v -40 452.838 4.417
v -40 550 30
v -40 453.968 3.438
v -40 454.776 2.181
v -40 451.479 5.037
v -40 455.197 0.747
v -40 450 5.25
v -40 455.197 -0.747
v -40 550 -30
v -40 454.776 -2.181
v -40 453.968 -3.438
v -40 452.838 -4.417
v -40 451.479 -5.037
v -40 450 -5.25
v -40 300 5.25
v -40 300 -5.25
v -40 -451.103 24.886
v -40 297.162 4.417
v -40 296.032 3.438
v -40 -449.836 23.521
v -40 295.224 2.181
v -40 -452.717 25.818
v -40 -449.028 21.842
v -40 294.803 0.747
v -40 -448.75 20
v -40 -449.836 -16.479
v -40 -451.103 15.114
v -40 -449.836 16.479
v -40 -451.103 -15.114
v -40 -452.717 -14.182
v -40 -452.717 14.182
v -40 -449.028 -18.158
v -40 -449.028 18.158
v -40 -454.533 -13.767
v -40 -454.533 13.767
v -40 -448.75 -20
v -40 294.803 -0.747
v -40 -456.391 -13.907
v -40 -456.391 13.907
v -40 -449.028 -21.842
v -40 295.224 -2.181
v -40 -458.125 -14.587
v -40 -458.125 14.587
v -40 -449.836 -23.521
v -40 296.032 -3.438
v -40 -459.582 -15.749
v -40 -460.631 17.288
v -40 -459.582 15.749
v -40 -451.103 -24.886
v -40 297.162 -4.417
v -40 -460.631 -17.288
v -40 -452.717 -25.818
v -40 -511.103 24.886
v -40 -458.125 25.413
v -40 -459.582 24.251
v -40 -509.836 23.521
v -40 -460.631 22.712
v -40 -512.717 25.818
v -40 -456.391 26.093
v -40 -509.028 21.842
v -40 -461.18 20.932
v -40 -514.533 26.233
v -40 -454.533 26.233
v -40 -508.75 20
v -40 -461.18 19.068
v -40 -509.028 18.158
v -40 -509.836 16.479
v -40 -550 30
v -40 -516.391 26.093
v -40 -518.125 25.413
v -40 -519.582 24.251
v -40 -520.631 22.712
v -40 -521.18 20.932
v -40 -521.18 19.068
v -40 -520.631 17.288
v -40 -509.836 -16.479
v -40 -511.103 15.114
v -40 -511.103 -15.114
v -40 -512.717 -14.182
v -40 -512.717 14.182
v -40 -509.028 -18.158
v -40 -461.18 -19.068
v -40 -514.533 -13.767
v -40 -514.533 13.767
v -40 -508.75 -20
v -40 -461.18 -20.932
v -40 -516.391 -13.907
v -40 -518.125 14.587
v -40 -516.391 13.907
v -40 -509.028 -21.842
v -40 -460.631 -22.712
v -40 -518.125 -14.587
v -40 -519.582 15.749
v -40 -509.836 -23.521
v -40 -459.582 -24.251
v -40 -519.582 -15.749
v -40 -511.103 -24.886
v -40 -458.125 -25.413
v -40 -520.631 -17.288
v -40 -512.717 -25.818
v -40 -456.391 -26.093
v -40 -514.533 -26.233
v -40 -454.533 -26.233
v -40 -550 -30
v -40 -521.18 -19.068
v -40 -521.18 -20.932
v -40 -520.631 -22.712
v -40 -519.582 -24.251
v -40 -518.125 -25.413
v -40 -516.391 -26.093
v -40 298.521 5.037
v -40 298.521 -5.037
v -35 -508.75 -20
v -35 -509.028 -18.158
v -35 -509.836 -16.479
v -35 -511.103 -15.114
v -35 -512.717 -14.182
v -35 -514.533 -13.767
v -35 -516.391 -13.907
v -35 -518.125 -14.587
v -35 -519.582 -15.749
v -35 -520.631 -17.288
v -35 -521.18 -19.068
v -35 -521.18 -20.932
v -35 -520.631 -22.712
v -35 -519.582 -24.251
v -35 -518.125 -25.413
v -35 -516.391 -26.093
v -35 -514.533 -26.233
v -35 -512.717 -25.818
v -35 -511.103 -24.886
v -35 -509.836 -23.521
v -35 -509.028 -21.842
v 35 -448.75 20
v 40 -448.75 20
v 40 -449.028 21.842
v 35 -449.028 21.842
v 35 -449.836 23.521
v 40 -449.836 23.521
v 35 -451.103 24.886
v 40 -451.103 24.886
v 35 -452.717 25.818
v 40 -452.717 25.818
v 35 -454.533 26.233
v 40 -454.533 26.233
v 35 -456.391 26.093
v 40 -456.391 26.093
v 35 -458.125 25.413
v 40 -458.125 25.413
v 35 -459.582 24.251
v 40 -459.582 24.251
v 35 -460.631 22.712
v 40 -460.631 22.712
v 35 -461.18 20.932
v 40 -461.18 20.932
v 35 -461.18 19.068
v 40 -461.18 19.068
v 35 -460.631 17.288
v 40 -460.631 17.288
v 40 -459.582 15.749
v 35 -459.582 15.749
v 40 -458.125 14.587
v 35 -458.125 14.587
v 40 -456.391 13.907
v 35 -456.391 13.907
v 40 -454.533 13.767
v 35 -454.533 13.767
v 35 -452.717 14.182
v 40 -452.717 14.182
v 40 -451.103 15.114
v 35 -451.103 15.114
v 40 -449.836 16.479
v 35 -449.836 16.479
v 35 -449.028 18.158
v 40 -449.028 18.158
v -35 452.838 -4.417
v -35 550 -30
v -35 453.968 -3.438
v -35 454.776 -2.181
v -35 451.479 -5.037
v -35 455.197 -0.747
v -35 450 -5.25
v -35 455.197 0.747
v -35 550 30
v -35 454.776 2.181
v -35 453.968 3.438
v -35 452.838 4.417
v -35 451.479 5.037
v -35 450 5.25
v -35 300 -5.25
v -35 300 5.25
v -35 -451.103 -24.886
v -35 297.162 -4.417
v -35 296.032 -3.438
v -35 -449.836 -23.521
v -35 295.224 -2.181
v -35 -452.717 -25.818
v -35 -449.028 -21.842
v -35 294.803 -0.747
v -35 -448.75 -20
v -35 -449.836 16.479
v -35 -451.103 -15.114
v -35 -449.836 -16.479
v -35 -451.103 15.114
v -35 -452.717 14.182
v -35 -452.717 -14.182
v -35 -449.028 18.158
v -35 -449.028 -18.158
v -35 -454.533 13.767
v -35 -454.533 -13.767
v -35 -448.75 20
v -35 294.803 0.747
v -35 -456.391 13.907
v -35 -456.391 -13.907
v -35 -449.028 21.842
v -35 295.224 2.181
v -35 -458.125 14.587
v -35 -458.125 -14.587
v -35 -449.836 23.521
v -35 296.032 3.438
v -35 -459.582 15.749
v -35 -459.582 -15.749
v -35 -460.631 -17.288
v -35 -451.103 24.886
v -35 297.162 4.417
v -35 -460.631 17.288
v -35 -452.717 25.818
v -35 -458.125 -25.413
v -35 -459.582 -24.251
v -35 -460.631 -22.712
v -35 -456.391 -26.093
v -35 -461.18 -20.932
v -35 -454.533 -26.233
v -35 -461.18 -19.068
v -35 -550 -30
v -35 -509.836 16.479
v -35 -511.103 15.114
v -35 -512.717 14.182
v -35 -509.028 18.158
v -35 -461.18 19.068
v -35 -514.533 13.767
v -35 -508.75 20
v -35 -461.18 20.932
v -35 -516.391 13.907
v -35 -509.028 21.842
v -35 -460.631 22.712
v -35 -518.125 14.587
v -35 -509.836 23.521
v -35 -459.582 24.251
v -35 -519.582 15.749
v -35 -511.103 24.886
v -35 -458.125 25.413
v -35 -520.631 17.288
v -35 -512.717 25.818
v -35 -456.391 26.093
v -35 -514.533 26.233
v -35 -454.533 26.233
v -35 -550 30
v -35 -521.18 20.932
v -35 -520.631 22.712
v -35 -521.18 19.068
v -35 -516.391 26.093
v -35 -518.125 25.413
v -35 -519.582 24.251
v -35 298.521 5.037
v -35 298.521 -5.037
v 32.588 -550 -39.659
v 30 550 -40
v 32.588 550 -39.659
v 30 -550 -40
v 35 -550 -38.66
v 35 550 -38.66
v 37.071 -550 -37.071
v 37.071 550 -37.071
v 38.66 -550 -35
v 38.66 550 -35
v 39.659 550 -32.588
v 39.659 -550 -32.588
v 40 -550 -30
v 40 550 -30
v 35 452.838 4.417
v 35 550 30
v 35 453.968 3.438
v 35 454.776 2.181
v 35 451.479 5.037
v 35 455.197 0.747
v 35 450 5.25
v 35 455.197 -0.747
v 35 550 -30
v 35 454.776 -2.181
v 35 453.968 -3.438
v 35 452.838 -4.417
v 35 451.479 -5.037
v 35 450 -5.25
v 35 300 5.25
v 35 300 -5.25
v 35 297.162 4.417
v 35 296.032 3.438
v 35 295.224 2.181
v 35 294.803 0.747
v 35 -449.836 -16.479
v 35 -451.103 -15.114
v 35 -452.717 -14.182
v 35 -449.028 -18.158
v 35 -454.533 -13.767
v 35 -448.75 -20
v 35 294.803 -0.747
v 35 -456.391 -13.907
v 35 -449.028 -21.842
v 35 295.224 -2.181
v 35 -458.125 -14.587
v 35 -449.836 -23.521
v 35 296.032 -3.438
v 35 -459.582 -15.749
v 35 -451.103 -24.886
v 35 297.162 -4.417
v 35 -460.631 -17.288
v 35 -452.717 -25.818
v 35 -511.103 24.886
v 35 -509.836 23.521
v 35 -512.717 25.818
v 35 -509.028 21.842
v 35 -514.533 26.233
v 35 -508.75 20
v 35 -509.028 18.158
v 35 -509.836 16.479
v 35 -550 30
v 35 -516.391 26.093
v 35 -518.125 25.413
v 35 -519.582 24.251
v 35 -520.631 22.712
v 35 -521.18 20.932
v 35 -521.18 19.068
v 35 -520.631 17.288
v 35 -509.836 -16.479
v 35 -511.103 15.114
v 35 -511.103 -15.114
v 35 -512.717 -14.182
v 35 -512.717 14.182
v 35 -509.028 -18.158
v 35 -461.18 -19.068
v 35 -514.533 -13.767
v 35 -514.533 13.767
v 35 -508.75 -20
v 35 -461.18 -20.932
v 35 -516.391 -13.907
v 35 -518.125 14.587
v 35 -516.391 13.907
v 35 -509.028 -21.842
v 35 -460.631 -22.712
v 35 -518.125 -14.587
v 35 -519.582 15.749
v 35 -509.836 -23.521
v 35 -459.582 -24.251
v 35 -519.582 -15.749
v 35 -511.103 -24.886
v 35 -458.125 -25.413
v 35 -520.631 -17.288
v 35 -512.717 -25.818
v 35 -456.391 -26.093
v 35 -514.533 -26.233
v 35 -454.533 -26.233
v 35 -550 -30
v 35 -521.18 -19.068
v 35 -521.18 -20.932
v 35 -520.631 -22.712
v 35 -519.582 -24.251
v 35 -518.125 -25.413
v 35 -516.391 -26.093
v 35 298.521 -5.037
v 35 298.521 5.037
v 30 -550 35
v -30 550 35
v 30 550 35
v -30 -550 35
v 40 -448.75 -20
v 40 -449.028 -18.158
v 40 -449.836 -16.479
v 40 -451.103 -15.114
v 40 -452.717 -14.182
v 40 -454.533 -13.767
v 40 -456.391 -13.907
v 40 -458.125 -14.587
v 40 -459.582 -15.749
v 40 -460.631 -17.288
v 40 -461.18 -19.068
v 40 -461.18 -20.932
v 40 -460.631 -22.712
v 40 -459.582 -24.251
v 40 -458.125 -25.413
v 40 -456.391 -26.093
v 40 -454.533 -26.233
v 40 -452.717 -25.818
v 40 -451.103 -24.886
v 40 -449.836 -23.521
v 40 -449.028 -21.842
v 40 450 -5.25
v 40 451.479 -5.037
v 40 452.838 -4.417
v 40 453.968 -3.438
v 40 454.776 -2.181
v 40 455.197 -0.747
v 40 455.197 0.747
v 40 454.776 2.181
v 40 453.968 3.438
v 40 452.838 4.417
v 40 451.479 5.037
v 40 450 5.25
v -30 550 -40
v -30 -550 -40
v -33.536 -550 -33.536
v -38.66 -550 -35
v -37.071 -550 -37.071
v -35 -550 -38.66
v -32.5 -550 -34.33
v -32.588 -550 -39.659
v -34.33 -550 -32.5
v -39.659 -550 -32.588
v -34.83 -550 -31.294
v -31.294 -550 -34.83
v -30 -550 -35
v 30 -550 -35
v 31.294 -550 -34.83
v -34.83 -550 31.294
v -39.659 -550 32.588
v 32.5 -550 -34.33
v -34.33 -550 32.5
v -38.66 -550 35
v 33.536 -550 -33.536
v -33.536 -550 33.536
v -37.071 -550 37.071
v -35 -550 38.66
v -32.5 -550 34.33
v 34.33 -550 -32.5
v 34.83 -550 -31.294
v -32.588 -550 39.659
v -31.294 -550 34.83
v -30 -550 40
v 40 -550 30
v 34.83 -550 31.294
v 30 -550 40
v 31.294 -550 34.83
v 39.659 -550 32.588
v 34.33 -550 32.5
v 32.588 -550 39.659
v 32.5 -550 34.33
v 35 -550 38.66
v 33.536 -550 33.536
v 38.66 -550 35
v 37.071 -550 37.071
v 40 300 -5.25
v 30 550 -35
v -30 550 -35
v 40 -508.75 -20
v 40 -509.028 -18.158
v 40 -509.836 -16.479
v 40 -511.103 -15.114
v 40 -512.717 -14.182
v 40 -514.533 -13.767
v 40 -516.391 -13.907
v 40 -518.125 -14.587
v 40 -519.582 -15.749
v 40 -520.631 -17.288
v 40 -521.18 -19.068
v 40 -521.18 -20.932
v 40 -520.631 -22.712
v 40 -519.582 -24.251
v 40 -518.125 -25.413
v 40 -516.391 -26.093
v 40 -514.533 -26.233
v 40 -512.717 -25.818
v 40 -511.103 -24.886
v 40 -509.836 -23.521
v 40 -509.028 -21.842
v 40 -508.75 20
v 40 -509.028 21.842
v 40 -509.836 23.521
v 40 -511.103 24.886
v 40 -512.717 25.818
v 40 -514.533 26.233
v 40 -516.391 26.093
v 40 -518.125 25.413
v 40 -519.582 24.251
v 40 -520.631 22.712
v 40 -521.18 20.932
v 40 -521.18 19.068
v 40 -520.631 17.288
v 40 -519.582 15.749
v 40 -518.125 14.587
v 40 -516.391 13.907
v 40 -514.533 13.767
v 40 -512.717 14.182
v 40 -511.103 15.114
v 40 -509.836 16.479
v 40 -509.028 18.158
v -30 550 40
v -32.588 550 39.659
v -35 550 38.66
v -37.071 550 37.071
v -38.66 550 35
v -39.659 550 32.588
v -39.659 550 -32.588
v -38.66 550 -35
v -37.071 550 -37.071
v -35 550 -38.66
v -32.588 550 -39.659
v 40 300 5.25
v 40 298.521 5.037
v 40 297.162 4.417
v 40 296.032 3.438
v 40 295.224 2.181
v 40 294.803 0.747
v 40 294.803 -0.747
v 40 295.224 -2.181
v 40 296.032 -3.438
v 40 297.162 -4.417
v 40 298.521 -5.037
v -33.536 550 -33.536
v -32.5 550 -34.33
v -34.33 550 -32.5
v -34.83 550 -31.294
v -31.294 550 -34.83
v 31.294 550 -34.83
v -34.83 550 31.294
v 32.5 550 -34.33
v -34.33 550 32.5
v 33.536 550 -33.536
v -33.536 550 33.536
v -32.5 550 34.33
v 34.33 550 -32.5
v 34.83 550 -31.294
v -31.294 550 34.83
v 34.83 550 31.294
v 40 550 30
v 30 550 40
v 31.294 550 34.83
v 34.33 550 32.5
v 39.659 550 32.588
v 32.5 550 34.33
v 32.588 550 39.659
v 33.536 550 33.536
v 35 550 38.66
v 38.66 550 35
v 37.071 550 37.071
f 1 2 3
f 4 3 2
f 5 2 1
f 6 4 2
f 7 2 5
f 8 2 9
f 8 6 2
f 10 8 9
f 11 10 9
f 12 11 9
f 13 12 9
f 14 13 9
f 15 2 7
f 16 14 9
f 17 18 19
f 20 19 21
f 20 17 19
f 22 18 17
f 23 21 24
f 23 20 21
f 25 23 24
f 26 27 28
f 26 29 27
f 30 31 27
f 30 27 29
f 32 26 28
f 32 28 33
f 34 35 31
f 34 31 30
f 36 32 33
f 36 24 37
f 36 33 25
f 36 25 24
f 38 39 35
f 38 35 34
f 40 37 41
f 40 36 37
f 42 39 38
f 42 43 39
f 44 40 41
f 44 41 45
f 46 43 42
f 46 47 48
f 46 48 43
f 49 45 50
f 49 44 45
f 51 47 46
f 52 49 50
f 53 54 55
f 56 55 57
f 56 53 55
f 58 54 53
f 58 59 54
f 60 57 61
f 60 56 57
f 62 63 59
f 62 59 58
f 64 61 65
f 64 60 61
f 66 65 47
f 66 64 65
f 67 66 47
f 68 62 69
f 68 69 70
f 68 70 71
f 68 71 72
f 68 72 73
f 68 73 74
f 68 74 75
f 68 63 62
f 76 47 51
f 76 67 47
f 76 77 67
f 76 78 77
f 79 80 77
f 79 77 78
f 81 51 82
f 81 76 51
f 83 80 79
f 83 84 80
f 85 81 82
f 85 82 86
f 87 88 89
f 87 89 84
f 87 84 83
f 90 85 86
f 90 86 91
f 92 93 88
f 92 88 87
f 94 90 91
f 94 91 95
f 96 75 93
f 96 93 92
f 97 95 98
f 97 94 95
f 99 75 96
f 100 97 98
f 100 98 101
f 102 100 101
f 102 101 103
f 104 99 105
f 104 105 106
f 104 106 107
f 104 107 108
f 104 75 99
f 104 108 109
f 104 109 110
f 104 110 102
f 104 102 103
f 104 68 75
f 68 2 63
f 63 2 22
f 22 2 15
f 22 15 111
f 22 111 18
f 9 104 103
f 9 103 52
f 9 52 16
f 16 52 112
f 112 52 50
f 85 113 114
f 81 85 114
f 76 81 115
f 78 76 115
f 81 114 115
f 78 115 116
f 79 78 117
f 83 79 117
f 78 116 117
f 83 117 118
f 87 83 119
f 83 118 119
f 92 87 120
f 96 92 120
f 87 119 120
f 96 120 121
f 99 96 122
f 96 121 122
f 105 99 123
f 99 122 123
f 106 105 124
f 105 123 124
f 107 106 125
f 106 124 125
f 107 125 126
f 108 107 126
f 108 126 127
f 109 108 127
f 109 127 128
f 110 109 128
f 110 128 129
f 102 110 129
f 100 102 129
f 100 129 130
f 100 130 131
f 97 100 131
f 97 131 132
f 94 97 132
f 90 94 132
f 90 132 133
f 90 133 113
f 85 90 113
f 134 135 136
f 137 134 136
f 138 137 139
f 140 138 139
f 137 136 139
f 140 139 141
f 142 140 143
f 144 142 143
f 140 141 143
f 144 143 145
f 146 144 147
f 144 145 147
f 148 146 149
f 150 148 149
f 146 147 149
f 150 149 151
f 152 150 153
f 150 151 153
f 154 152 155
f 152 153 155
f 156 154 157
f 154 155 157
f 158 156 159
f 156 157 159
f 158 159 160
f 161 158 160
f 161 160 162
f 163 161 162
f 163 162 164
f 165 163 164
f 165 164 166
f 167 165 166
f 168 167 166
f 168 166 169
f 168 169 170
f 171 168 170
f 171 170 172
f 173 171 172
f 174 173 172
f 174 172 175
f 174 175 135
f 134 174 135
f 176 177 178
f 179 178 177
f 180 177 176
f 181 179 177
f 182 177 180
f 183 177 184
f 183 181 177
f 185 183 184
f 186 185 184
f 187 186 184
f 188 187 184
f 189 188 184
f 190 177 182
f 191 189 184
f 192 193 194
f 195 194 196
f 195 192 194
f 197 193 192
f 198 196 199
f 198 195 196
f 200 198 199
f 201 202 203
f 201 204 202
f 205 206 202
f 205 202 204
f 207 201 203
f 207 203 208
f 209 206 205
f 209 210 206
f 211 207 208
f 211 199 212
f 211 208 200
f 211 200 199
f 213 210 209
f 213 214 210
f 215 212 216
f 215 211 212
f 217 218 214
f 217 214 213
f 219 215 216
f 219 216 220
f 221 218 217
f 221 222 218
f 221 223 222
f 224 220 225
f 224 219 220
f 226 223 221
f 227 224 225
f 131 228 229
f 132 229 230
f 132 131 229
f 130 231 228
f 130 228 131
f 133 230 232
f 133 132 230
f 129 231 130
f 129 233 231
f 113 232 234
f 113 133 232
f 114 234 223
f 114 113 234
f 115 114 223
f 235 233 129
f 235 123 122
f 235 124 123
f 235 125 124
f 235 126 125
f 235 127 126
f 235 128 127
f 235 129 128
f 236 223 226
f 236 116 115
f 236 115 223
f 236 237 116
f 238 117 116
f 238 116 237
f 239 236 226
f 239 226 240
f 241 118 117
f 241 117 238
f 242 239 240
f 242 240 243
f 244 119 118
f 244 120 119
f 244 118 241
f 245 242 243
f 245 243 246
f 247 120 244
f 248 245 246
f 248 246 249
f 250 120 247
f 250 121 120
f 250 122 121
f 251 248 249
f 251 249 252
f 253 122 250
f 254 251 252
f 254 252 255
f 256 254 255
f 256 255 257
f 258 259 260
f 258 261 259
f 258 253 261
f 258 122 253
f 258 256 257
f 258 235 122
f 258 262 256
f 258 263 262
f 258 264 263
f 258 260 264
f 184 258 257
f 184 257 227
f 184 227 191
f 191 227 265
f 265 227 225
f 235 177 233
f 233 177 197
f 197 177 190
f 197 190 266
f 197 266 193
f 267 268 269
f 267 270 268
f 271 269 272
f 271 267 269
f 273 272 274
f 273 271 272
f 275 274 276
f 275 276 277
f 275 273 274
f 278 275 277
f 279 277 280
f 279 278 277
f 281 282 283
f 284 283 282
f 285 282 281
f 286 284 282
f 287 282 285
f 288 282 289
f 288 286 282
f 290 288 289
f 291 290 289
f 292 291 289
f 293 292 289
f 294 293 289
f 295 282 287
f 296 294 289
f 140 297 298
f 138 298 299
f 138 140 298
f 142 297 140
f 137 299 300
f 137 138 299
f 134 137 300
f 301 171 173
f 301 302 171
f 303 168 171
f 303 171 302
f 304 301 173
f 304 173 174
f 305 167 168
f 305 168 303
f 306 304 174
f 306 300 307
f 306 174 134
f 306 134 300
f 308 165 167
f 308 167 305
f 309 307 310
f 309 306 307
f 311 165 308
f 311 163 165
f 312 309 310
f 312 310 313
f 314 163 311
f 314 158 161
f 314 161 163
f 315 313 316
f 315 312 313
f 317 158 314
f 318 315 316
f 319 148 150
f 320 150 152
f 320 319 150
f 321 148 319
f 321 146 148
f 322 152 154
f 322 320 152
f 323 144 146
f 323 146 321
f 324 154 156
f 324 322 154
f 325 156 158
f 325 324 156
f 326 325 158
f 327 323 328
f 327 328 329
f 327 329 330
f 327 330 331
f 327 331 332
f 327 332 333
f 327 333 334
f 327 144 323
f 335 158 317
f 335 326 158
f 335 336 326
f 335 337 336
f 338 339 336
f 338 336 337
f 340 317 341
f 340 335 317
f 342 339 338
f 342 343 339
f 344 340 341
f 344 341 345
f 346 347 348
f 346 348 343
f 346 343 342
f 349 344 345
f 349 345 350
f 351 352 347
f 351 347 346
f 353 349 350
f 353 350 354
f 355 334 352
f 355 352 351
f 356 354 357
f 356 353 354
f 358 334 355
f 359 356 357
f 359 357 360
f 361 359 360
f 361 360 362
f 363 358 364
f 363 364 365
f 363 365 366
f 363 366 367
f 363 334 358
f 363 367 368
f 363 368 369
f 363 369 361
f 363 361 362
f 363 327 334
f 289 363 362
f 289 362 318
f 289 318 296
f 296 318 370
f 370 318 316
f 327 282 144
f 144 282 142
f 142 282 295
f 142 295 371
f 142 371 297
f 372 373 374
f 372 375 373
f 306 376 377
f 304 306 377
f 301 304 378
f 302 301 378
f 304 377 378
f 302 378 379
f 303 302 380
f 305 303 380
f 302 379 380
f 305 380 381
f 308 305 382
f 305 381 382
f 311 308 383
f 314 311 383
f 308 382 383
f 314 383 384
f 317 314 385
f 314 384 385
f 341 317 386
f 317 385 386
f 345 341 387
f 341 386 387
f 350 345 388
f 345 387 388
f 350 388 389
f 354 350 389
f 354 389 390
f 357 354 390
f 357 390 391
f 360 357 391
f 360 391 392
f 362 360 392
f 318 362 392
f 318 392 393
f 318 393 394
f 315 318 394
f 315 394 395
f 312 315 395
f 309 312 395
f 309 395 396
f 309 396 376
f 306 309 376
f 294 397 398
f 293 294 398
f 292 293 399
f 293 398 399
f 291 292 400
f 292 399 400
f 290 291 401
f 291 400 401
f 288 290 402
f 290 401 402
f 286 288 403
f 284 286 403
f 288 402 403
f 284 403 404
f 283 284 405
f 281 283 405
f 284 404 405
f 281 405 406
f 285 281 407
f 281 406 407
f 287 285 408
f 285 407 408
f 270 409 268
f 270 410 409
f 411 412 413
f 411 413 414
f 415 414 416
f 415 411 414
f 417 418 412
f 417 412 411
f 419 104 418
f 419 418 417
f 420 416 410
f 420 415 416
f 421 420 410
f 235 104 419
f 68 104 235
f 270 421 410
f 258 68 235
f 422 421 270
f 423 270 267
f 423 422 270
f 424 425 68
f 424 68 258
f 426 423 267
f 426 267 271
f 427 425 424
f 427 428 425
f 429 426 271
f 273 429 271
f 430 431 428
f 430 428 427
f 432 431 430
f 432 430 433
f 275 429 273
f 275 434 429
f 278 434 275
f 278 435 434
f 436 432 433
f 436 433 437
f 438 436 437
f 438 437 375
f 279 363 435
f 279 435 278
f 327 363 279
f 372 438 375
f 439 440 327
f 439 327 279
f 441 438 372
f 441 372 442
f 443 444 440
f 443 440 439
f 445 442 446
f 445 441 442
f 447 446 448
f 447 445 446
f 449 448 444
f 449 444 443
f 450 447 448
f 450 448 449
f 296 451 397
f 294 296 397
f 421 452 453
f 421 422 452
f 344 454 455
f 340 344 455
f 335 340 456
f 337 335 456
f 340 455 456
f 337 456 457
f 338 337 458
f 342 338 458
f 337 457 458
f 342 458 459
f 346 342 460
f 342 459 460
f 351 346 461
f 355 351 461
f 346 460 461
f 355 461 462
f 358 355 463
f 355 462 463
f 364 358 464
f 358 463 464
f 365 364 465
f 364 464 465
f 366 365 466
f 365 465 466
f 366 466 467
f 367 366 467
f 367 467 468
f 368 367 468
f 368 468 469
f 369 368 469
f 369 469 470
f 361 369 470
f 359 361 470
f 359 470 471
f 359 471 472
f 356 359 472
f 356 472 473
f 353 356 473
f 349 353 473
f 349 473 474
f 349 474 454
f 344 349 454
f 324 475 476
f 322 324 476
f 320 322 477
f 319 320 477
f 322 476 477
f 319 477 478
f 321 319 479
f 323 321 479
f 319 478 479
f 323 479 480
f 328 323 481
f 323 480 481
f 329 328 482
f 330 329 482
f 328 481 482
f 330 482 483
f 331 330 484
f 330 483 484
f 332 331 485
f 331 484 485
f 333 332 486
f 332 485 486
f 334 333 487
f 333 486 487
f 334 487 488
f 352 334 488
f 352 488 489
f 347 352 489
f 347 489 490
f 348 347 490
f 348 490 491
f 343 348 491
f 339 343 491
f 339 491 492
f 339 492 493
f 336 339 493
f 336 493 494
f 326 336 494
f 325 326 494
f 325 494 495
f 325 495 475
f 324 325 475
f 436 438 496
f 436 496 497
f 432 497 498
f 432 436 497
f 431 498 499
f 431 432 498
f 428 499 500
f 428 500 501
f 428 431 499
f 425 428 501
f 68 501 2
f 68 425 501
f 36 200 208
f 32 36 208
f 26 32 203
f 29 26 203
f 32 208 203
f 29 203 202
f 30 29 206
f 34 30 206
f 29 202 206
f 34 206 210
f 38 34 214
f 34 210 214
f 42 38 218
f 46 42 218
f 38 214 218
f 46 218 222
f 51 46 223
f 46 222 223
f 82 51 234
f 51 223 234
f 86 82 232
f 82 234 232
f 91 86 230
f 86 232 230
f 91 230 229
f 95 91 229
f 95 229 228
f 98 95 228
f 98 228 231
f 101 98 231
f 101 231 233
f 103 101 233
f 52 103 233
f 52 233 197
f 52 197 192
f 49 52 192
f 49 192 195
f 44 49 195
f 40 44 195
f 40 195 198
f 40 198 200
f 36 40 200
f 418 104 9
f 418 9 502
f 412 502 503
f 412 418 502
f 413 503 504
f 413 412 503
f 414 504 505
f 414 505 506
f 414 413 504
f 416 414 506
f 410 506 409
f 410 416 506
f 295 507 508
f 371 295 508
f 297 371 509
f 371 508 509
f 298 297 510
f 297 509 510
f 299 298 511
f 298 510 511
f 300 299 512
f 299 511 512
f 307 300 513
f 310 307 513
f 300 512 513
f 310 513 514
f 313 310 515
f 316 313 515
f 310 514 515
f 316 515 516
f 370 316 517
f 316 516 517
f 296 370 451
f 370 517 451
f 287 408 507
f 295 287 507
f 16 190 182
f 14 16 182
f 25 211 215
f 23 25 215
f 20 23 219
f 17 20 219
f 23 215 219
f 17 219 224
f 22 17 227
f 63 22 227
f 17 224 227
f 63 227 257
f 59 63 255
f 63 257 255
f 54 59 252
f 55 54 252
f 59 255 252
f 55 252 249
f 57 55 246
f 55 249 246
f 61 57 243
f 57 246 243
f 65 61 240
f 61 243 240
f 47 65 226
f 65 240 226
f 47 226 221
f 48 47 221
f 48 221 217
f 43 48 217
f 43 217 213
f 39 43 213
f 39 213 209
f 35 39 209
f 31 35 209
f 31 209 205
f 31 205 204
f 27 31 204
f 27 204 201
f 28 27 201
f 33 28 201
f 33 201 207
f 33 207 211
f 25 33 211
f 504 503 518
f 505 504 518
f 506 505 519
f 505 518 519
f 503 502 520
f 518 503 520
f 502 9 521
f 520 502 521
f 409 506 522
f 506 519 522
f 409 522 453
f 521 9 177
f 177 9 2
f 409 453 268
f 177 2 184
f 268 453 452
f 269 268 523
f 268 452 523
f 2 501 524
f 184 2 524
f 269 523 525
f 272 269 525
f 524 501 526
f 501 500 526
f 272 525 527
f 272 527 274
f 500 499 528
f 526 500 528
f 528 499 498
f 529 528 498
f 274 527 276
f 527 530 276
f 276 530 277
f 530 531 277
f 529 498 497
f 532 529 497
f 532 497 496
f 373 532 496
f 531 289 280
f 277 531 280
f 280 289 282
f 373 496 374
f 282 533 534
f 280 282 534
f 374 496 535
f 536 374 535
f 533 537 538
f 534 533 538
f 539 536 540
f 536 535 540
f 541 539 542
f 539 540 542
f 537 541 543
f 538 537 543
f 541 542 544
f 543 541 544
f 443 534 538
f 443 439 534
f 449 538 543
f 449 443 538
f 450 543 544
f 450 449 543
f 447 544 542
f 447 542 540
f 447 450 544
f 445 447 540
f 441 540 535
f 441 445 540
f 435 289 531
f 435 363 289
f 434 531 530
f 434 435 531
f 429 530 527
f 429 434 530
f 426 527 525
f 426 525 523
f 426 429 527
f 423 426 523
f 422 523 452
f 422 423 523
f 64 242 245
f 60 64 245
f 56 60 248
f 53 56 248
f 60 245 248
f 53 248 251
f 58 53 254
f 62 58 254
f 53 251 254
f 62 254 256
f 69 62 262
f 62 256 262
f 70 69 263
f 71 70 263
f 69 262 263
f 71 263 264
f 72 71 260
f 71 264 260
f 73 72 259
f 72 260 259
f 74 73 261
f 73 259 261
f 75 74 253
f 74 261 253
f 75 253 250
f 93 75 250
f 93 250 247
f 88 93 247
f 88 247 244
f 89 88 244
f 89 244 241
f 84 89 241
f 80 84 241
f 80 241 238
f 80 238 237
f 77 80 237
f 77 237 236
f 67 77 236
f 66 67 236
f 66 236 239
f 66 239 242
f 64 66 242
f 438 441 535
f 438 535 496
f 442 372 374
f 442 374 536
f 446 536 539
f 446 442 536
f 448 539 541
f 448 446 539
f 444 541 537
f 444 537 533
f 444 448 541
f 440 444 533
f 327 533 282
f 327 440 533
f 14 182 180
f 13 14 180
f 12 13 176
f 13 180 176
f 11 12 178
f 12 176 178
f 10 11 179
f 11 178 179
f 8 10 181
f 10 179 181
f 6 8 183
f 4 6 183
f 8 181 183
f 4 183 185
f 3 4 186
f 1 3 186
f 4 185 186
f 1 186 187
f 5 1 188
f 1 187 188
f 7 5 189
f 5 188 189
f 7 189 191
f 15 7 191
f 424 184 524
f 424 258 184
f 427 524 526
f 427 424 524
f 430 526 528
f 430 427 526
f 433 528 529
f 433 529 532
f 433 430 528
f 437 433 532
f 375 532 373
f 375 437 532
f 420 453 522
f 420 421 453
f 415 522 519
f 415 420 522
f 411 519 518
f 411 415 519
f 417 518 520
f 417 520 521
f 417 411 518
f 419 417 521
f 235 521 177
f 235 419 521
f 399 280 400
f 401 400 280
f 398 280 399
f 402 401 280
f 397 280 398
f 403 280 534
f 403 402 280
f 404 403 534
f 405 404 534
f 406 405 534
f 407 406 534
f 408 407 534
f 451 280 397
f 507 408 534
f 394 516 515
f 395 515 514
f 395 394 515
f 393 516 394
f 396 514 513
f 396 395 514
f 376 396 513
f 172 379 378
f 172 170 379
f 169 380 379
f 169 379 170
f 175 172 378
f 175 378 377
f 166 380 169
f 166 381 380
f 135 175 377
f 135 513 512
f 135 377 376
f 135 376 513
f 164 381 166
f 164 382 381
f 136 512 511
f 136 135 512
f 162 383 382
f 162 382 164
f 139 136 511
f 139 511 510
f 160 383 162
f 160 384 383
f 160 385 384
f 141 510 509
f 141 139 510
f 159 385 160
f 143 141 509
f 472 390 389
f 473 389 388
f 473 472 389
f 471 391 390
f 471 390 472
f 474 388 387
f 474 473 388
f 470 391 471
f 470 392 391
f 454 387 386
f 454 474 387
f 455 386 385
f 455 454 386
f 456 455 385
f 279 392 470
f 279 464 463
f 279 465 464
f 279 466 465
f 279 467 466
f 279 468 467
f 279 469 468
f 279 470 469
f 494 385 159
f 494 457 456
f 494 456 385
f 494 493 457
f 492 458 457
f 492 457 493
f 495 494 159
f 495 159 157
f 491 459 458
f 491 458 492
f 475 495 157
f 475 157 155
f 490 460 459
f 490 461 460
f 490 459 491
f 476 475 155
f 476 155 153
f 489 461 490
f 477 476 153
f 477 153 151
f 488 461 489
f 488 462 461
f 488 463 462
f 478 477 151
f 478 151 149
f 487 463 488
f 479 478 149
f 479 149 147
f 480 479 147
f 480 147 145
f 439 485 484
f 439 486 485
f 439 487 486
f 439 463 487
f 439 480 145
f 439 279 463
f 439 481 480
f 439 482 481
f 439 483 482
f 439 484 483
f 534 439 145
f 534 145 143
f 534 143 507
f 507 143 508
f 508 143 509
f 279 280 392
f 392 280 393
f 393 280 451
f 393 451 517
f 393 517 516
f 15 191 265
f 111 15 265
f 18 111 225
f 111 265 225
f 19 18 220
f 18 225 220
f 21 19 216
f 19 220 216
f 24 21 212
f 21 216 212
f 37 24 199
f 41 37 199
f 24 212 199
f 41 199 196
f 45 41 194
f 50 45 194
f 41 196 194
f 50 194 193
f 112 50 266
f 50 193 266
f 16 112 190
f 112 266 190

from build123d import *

# Parameters (mm, degrees)
F1_DEPTH = 550
F2_R     = 6.25
F3_DEPTH = 80.001
F5_DEPTH = 80.001


with BuildPart() as f1:
    # F0 (on Front) → F1 (new body, symmetric)
    with BuildSketch(Plane.XZ):
        with BuildLine():
            ThreePointArc((40, 30), (37.071068, 37.071068), (30, 40))
            Line((30, 40), (-30, 40))
            ThreePointArc((-30, 40), (-37.071068, 37.071068), (-40, 30))
            Line((-40, 30), (-40, -30))
            ThreePointArc((-40, -30), (-37.071068, -37.071068), (-30, -40))
            Line((-30, -40), (30, -40))
            ThreePointArc((30, -40), (37.071068, -37.071068), (40, -30))
            Line((40, -30), (40, 30))
        make_face()
        with BuildLine():
            ThreePointArc((30, 35), (33.535534, 33.535534), (35, 30))
            Line((35, 30), (35, -30))
            ThreePointArc((35, -30), (33.535534, -33.535534), (30, -35))
            Line((30, -35), (-30, -35))
            ThreePointArc((-30, -35), (-33.535534, -33.535534), (-35, -30))
            Line((-35, -30), (-35, 30))
            ThreePointArc((-35, 30), (-33.535534, 33.535534), (-30, 35))
            Line((-30, 35), (30, 35))
        make_face(mode=Mode.SUBTRACT)
    extrude(amount=F1_DEPTH, both=True)

    # F2 (on face) → F3 (cut, through all)
    with BuildSketch(Plane.YZ.offset(40)):
        with Locations((-515, 20)):
            Circle(F2_R)
        with Locations((-515, -20)):
            Circle(F2_R)
        with Locations((-455, 20)):
            Circle(F2_R)
        with Locations((-455, -20)):
            Circle(F2_R)
    extrude(amount=-F3_DEPTH, mode=Mode.SUBTRACT)

    # F4 (on face) → F5 (cut, through all)
    with BuildSketch(Plane.YZ.offset(40)):
        with BuildLine():
            ThreePointArc((450, -5.25), (455.25, 0), (450, 5.25))
            Line((450, 5.25), (300, 5.25))
            ThreePointArc((300, 5.25), (294.75, 0), (300, -5.25))
            Line((300, -5.25), (450, -5.25))
        make_face()
    extrude(amount=-F5_DEPTH, mode=Mode.SUBTRACT)


solid = f1.part
